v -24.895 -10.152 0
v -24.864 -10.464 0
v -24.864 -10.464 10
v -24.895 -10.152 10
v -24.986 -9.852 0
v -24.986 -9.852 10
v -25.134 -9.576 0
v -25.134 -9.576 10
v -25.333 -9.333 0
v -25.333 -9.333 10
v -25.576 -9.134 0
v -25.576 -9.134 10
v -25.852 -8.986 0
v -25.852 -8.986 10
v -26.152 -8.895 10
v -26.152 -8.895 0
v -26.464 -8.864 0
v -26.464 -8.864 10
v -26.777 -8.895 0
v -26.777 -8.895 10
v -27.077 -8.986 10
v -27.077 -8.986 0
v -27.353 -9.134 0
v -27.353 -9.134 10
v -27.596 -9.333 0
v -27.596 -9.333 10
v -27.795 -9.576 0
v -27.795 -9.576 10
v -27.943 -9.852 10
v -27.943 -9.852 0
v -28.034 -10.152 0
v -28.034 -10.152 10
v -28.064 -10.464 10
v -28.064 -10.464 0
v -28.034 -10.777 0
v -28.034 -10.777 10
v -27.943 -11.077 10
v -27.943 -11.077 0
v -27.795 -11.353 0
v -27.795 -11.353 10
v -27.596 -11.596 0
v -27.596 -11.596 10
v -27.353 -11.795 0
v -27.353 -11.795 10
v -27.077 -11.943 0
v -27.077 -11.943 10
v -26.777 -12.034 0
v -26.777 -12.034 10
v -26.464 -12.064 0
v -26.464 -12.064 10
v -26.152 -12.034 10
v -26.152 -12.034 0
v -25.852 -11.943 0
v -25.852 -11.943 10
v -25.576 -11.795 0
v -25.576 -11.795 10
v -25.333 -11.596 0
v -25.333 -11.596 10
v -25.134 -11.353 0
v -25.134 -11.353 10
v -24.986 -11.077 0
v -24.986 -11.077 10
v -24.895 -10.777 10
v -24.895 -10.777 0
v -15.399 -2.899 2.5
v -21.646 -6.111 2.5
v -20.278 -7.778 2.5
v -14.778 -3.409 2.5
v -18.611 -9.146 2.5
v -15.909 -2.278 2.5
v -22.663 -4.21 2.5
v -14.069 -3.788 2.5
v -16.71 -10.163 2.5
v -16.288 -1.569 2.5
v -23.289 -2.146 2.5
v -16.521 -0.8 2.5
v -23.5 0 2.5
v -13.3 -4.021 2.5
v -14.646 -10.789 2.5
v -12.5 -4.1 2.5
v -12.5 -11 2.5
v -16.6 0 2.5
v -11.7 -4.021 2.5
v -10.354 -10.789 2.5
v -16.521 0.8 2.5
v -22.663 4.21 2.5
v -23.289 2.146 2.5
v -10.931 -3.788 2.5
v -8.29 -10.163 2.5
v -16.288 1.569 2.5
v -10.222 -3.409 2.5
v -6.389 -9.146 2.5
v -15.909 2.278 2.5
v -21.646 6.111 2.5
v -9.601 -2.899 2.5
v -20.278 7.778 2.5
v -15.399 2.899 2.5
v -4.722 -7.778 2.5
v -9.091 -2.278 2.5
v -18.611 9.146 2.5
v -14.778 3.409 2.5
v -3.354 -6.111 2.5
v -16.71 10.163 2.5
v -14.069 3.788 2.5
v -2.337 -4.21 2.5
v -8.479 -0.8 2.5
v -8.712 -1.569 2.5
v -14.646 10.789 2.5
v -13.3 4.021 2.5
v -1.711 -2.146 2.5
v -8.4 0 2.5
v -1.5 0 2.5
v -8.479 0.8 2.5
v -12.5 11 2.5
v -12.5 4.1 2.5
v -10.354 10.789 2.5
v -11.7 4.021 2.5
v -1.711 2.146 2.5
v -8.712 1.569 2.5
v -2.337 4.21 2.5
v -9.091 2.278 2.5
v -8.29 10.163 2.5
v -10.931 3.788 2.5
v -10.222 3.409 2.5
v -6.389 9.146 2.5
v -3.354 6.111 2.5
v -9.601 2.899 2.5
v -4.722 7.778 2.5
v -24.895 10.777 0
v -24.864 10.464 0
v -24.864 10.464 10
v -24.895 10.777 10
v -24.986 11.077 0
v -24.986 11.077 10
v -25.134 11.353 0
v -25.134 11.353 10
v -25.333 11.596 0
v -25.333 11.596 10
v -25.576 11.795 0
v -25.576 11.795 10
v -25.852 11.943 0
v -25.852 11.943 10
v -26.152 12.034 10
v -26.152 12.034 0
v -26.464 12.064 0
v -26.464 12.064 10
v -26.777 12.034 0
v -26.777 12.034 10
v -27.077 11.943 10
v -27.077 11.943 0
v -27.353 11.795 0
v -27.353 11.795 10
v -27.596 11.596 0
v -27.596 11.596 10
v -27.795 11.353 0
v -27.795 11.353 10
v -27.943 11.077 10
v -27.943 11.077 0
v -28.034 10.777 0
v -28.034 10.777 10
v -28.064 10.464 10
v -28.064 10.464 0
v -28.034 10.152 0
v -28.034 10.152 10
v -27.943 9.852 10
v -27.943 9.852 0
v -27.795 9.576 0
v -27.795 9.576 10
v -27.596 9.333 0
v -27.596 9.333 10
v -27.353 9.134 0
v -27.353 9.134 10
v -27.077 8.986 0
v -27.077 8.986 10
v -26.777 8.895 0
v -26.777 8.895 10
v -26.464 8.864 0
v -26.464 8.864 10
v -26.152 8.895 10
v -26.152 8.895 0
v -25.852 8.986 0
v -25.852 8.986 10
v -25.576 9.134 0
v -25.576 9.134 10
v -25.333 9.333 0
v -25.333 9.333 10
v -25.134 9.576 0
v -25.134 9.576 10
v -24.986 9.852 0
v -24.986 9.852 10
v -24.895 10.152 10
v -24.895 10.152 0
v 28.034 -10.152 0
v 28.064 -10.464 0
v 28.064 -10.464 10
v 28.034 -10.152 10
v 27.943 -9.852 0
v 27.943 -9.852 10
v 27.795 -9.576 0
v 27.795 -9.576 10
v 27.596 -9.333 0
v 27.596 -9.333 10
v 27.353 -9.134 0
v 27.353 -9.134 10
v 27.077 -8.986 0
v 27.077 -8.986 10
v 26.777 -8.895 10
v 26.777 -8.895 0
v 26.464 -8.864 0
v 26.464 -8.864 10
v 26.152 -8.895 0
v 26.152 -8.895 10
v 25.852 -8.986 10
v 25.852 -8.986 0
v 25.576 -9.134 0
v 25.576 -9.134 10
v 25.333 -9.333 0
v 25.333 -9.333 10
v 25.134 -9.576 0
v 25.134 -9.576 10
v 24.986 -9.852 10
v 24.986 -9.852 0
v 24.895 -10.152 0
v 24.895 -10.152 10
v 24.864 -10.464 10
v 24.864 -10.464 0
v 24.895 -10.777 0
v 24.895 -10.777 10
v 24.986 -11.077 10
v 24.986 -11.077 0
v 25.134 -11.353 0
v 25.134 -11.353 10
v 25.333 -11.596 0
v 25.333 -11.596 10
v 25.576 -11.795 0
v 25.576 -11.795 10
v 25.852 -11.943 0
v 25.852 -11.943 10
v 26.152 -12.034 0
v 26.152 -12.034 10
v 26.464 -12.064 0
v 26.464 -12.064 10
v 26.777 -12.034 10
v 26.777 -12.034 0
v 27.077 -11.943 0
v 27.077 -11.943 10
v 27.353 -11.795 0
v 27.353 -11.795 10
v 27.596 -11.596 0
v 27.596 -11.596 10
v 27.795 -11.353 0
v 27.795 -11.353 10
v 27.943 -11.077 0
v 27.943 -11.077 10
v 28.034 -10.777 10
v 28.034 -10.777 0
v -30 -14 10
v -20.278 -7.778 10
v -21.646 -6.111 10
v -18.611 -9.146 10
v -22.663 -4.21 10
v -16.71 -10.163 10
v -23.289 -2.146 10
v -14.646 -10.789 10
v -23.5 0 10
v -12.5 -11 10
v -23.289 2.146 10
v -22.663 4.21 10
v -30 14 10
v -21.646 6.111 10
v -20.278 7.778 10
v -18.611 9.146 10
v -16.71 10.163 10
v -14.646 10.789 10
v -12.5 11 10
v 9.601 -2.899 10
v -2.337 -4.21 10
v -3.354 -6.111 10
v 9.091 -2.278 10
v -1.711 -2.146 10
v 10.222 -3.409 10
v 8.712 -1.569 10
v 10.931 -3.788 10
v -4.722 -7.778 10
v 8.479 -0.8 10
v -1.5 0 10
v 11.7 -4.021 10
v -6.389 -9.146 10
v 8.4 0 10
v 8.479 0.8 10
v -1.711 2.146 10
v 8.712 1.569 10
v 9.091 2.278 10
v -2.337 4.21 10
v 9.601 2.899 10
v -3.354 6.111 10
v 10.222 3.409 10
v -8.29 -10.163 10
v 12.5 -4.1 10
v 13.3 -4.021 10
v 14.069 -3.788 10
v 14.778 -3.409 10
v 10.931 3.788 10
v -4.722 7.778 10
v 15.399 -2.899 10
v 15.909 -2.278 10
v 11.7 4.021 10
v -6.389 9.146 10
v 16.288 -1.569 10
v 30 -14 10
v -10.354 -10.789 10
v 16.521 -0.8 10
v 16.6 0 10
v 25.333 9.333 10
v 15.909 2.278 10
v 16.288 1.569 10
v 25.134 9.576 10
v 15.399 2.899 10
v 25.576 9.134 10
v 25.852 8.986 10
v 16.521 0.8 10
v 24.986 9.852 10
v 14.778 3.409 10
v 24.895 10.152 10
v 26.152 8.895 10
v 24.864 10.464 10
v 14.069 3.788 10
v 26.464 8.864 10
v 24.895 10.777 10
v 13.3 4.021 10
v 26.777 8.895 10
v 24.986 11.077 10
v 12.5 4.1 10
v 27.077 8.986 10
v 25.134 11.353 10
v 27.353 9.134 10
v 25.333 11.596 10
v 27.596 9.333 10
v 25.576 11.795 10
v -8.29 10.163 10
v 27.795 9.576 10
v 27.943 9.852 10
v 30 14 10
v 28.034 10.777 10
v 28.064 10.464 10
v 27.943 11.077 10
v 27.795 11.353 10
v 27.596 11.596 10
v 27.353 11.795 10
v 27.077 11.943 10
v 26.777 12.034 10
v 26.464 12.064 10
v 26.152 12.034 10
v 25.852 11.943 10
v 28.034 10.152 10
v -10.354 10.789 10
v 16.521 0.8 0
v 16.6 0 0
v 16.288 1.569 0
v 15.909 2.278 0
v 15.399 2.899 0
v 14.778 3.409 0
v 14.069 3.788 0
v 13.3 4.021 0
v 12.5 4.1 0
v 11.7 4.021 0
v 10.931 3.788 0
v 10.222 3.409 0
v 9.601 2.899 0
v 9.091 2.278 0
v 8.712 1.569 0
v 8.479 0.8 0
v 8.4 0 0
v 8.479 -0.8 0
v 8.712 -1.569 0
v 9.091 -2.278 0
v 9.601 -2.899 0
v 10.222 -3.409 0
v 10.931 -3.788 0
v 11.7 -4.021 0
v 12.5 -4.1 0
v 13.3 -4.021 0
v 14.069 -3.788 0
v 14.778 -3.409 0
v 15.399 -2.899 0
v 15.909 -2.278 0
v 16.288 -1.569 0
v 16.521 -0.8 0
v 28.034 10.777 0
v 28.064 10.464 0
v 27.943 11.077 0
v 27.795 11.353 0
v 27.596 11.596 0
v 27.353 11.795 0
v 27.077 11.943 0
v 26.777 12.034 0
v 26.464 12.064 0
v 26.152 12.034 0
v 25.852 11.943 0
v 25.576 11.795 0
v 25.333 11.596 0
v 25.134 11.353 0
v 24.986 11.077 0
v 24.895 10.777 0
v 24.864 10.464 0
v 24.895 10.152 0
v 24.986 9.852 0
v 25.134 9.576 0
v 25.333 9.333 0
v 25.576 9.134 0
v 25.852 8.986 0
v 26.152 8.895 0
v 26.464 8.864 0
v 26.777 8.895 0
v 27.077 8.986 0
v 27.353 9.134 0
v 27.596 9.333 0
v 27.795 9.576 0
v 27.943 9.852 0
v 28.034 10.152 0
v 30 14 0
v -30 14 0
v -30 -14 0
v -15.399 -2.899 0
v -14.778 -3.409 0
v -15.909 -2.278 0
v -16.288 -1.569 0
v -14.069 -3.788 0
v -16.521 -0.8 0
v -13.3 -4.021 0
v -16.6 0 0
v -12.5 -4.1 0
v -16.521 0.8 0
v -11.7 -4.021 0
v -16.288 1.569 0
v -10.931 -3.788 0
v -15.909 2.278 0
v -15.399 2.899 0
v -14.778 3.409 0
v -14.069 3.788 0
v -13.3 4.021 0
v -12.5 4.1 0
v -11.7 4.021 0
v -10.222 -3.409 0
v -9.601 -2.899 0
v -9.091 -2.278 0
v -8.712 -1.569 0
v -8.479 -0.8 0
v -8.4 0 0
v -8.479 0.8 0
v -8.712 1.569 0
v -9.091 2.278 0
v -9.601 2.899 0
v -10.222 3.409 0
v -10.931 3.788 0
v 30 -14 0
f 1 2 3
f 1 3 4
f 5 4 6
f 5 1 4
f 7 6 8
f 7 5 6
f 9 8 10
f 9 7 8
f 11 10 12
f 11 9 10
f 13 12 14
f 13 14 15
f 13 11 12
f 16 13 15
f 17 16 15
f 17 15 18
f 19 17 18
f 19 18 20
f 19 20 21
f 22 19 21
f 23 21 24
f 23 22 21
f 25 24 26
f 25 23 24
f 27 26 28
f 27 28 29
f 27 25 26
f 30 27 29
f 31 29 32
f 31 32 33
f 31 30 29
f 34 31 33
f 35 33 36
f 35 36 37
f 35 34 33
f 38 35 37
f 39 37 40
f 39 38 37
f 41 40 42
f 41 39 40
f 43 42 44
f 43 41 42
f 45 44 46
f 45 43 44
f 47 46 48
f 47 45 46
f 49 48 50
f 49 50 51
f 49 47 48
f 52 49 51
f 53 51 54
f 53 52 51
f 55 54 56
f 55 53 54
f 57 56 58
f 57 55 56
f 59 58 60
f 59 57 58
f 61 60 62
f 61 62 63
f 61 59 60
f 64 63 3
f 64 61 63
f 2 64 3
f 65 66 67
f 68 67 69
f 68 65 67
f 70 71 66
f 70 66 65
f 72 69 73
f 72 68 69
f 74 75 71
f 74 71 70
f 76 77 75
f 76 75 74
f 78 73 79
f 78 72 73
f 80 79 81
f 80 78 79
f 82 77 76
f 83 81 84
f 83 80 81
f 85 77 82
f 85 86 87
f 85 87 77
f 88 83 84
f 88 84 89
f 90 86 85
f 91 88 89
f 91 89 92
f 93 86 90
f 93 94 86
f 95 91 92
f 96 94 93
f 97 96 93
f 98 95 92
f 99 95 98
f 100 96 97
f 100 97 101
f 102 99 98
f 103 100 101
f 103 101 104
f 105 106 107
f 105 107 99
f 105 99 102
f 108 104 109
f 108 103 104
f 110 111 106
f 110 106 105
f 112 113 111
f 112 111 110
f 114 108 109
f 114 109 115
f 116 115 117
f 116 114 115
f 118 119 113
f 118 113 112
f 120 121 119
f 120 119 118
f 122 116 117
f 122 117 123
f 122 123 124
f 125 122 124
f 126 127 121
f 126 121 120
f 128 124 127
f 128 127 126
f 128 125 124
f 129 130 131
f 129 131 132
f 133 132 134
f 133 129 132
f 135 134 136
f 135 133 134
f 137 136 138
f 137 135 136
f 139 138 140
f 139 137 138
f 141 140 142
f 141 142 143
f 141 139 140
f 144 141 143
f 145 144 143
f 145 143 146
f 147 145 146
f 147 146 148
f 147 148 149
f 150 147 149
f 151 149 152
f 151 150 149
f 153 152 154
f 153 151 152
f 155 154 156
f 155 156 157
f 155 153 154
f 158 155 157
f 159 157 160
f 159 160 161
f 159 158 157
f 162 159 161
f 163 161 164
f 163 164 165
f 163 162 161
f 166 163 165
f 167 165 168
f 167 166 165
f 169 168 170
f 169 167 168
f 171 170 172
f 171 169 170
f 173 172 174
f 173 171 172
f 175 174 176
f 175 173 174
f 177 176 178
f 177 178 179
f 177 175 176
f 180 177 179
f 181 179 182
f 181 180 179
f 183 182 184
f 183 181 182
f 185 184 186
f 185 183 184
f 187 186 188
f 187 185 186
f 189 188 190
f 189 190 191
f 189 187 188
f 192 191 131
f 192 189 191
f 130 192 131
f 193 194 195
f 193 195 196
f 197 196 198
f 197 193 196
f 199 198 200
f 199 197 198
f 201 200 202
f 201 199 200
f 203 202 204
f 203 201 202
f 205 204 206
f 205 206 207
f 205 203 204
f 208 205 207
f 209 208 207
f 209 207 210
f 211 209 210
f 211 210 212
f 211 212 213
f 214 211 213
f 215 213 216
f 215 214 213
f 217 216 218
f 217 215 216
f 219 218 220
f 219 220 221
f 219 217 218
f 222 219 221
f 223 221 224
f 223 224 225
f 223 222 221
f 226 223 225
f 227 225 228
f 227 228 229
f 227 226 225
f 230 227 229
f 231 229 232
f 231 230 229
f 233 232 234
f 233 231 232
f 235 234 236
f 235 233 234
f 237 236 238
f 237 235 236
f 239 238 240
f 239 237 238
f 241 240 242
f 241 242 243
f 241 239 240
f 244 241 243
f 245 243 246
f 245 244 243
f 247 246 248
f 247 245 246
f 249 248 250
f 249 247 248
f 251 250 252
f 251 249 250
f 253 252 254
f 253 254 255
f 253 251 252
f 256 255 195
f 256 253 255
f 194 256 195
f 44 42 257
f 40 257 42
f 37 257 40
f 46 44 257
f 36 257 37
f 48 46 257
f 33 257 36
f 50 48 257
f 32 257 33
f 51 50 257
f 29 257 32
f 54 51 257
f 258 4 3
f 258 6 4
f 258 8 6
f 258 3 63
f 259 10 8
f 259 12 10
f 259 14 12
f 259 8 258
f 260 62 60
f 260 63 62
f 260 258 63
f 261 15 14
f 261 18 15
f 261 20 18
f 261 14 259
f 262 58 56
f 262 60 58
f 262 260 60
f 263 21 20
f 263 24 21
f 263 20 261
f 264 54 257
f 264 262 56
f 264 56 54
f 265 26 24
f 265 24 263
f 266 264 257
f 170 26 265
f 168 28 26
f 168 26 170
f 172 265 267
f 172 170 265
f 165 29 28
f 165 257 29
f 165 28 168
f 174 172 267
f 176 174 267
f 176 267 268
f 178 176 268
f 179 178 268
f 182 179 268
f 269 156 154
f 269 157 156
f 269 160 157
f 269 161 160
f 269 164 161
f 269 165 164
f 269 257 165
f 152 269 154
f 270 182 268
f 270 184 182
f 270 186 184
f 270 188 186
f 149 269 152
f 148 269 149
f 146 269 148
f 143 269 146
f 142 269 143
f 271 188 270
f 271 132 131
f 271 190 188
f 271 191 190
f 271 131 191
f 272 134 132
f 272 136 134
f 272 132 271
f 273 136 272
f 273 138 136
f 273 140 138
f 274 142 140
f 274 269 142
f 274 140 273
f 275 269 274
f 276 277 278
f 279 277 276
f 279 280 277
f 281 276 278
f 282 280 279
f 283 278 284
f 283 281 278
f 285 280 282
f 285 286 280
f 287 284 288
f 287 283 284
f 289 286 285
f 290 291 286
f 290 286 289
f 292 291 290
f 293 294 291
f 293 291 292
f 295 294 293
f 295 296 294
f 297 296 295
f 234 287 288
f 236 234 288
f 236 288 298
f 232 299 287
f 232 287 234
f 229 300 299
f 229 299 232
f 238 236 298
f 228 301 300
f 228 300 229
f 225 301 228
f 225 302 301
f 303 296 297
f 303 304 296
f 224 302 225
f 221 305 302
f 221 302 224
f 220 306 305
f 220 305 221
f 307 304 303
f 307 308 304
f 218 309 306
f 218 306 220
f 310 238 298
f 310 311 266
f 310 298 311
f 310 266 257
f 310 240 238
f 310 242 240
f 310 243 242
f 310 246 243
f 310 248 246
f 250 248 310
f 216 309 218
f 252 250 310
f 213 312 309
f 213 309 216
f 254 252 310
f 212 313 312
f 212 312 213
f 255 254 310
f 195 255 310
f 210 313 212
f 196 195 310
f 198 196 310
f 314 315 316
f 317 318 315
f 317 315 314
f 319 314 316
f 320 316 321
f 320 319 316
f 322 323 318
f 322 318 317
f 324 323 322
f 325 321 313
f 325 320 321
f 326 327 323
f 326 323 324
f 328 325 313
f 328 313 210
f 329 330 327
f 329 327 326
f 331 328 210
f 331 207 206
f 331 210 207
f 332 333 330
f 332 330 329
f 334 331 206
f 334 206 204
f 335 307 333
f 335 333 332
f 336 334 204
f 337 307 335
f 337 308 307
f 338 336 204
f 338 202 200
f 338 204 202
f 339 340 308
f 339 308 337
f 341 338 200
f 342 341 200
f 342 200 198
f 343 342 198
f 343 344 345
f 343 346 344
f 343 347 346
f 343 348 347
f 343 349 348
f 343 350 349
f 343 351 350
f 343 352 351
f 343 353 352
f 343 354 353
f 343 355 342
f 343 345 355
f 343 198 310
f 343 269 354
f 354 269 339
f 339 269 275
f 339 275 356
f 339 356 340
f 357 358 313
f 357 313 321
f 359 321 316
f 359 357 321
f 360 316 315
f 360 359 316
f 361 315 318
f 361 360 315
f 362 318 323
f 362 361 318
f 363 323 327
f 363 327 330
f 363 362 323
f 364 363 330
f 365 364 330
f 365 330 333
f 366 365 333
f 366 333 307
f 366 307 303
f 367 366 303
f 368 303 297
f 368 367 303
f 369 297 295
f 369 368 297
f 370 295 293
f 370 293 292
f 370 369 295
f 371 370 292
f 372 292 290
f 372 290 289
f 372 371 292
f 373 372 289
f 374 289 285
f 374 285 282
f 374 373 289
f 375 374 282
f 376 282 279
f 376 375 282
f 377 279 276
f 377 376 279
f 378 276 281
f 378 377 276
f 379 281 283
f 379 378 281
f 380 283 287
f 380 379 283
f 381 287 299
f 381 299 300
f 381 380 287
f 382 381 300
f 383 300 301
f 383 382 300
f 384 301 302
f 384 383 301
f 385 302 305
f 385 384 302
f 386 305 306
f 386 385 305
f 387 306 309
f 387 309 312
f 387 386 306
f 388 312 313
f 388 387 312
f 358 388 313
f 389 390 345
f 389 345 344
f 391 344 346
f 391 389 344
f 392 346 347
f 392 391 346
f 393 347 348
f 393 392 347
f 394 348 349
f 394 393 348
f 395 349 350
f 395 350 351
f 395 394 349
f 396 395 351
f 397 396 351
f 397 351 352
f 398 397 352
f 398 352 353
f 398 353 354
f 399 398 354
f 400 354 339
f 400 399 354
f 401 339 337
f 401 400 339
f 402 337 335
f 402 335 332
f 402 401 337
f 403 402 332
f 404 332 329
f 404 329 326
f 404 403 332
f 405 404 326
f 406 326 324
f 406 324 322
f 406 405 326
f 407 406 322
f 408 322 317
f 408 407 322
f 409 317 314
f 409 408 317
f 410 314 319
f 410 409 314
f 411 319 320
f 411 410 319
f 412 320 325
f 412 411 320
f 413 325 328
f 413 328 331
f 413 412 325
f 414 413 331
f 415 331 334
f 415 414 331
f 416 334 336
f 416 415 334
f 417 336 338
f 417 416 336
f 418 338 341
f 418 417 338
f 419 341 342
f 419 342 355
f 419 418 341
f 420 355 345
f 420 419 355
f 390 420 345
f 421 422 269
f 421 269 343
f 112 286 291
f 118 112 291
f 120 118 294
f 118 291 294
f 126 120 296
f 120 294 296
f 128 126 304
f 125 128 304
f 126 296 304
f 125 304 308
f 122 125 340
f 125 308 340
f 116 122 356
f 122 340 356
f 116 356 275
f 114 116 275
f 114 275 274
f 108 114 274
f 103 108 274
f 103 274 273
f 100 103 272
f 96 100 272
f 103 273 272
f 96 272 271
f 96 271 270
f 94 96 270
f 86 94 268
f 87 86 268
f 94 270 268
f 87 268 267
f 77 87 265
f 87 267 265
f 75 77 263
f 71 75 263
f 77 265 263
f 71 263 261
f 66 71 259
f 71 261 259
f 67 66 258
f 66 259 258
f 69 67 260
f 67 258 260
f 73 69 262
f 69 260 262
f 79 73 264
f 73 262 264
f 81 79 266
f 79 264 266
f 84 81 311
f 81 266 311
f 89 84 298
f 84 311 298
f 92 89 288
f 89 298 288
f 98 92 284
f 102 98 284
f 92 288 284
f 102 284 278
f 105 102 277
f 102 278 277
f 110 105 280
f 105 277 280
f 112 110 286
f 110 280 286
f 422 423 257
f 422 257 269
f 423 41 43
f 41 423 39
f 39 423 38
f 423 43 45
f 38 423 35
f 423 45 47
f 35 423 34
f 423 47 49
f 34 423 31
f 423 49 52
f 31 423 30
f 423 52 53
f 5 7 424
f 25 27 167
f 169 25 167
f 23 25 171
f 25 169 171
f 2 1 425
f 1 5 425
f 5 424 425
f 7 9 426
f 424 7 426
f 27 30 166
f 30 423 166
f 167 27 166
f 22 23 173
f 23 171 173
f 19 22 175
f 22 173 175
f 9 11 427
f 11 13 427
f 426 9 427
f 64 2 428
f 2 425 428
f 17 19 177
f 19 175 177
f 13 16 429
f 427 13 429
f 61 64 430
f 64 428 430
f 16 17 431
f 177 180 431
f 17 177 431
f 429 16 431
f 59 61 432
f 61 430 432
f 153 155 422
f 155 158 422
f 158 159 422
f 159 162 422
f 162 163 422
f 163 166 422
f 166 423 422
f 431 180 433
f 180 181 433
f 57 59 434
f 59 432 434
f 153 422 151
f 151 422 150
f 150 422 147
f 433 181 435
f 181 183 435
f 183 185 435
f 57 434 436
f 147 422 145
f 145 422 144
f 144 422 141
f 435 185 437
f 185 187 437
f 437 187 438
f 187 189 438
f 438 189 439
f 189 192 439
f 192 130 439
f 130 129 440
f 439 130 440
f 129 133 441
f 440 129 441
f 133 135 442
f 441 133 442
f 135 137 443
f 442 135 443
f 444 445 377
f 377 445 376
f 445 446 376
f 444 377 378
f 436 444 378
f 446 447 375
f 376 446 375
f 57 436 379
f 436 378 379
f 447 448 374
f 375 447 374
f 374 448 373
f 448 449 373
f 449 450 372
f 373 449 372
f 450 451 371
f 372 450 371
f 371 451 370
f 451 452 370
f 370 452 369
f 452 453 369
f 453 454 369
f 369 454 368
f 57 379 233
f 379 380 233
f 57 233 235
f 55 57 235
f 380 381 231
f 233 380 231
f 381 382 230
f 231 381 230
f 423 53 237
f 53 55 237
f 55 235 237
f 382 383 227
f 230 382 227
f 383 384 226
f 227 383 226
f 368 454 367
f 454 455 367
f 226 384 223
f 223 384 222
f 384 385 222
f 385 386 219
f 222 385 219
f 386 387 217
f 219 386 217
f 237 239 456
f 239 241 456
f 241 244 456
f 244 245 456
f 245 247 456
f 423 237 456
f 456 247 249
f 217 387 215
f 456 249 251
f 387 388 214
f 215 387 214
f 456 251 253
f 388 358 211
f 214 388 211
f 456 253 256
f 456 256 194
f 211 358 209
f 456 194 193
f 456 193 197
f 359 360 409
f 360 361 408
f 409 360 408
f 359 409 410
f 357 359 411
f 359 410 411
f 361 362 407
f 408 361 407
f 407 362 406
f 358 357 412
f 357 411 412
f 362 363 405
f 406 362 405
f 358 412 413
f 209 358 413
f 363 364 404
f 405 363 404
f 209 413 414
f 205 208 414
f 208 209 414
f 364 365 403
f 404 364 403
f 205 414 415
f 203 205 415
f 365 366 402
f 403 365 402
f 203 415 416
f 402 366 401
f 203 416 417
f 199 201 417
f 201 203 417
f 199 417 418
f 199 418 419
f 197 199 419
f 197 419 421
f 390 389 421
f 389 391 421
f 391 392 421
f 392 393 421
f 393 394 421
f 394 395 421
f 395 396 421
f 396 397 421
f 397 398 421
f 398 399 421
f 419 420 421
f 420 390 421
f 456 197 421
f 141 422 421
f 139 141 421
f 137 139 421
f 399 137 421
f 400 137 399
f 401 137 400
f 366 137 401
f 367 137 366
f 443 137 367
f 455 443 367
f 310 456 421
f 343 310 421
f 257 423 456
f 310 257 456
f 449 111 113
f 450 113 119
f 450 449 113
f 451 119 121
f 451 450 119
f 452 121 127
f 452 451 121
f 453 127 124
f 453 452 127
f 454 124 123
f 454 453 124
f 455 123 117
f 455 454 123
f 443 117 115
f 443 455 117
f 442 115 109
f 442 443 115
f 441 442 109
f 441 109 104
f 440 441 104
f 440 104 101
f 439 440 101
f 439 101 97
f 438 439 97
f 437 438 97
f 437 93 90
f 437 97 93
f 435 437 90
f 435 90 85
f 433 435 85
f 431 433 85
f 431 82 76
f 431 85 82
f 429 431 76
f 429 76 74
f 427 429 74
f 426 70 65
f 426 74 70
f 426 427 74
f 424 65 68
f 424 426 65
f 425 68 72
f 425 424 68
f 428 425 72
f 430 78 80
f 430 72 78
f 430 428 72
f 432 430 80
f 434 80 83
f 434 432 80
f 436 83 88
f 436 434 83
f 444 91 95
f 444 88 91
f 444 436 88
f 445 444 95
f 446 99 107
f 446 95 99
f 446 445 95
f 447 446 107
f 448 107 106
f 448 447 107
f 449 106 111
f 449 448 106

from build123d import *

# Parameters (mm, degrees)
SKETCH1_W           = 60
SKETCH1_H           = 28
SKETCH1_R           = 4.1
SKETCH1_R_2         = 1.6
BOSS_EXTRUDE1_DEPTH = 10
SKETCH2_R           = 11
CUT_EXTRUDE1_DEPTH  = 7.5


with BuildPart() as part:
    # Sketch1 → Boss-Extrude1 (new body)
    with BuildSketch(Plane.XY):
        Rectangle(SKETCH1_W, SKETCH1_H)
        with Locations((12.5, 0)):
            Circle(SKETCH1_R, mode=Mode.SUBTRACT)
        with Locations((-12.5, 0)):
            Circle(SKETCH1_R, mode=Mode.SUBTRACT)
        with Locations((-26.464466094, 10.464466094)):
            Circle(SKETCH1_R_2, mode=Mode.SUBTRACT)
        with Locations((-26.464466094, -10.464466094)):
            Circle(SKETCH1_R_2, mode=Mode.SUBTRACT)
        with Locations((26.464466094, -10.464466094)):
            Circle(SKETCH1_R_2, mode=Mode.SUBTRACT)
        with Locations((26.464466094, 10.464466094)):
            Circle(SKETCH1_R_2, mode=Mode.SUBTRACT)
    extrude(amount=BOSS_EXTRUDE1_DEPTH)

    # Sketch2 → Cut-Extrude1 (cut)
    with BuildSketch(Plane.XY.offset(10)):
        with Locations((-12.5, 0)):
            Circle(SKETCH2_R)
    extrude(amount=-CUT_EXTRUDE1_DEPTH, mode=Mode.SUBTRACT)


solid = part.part
